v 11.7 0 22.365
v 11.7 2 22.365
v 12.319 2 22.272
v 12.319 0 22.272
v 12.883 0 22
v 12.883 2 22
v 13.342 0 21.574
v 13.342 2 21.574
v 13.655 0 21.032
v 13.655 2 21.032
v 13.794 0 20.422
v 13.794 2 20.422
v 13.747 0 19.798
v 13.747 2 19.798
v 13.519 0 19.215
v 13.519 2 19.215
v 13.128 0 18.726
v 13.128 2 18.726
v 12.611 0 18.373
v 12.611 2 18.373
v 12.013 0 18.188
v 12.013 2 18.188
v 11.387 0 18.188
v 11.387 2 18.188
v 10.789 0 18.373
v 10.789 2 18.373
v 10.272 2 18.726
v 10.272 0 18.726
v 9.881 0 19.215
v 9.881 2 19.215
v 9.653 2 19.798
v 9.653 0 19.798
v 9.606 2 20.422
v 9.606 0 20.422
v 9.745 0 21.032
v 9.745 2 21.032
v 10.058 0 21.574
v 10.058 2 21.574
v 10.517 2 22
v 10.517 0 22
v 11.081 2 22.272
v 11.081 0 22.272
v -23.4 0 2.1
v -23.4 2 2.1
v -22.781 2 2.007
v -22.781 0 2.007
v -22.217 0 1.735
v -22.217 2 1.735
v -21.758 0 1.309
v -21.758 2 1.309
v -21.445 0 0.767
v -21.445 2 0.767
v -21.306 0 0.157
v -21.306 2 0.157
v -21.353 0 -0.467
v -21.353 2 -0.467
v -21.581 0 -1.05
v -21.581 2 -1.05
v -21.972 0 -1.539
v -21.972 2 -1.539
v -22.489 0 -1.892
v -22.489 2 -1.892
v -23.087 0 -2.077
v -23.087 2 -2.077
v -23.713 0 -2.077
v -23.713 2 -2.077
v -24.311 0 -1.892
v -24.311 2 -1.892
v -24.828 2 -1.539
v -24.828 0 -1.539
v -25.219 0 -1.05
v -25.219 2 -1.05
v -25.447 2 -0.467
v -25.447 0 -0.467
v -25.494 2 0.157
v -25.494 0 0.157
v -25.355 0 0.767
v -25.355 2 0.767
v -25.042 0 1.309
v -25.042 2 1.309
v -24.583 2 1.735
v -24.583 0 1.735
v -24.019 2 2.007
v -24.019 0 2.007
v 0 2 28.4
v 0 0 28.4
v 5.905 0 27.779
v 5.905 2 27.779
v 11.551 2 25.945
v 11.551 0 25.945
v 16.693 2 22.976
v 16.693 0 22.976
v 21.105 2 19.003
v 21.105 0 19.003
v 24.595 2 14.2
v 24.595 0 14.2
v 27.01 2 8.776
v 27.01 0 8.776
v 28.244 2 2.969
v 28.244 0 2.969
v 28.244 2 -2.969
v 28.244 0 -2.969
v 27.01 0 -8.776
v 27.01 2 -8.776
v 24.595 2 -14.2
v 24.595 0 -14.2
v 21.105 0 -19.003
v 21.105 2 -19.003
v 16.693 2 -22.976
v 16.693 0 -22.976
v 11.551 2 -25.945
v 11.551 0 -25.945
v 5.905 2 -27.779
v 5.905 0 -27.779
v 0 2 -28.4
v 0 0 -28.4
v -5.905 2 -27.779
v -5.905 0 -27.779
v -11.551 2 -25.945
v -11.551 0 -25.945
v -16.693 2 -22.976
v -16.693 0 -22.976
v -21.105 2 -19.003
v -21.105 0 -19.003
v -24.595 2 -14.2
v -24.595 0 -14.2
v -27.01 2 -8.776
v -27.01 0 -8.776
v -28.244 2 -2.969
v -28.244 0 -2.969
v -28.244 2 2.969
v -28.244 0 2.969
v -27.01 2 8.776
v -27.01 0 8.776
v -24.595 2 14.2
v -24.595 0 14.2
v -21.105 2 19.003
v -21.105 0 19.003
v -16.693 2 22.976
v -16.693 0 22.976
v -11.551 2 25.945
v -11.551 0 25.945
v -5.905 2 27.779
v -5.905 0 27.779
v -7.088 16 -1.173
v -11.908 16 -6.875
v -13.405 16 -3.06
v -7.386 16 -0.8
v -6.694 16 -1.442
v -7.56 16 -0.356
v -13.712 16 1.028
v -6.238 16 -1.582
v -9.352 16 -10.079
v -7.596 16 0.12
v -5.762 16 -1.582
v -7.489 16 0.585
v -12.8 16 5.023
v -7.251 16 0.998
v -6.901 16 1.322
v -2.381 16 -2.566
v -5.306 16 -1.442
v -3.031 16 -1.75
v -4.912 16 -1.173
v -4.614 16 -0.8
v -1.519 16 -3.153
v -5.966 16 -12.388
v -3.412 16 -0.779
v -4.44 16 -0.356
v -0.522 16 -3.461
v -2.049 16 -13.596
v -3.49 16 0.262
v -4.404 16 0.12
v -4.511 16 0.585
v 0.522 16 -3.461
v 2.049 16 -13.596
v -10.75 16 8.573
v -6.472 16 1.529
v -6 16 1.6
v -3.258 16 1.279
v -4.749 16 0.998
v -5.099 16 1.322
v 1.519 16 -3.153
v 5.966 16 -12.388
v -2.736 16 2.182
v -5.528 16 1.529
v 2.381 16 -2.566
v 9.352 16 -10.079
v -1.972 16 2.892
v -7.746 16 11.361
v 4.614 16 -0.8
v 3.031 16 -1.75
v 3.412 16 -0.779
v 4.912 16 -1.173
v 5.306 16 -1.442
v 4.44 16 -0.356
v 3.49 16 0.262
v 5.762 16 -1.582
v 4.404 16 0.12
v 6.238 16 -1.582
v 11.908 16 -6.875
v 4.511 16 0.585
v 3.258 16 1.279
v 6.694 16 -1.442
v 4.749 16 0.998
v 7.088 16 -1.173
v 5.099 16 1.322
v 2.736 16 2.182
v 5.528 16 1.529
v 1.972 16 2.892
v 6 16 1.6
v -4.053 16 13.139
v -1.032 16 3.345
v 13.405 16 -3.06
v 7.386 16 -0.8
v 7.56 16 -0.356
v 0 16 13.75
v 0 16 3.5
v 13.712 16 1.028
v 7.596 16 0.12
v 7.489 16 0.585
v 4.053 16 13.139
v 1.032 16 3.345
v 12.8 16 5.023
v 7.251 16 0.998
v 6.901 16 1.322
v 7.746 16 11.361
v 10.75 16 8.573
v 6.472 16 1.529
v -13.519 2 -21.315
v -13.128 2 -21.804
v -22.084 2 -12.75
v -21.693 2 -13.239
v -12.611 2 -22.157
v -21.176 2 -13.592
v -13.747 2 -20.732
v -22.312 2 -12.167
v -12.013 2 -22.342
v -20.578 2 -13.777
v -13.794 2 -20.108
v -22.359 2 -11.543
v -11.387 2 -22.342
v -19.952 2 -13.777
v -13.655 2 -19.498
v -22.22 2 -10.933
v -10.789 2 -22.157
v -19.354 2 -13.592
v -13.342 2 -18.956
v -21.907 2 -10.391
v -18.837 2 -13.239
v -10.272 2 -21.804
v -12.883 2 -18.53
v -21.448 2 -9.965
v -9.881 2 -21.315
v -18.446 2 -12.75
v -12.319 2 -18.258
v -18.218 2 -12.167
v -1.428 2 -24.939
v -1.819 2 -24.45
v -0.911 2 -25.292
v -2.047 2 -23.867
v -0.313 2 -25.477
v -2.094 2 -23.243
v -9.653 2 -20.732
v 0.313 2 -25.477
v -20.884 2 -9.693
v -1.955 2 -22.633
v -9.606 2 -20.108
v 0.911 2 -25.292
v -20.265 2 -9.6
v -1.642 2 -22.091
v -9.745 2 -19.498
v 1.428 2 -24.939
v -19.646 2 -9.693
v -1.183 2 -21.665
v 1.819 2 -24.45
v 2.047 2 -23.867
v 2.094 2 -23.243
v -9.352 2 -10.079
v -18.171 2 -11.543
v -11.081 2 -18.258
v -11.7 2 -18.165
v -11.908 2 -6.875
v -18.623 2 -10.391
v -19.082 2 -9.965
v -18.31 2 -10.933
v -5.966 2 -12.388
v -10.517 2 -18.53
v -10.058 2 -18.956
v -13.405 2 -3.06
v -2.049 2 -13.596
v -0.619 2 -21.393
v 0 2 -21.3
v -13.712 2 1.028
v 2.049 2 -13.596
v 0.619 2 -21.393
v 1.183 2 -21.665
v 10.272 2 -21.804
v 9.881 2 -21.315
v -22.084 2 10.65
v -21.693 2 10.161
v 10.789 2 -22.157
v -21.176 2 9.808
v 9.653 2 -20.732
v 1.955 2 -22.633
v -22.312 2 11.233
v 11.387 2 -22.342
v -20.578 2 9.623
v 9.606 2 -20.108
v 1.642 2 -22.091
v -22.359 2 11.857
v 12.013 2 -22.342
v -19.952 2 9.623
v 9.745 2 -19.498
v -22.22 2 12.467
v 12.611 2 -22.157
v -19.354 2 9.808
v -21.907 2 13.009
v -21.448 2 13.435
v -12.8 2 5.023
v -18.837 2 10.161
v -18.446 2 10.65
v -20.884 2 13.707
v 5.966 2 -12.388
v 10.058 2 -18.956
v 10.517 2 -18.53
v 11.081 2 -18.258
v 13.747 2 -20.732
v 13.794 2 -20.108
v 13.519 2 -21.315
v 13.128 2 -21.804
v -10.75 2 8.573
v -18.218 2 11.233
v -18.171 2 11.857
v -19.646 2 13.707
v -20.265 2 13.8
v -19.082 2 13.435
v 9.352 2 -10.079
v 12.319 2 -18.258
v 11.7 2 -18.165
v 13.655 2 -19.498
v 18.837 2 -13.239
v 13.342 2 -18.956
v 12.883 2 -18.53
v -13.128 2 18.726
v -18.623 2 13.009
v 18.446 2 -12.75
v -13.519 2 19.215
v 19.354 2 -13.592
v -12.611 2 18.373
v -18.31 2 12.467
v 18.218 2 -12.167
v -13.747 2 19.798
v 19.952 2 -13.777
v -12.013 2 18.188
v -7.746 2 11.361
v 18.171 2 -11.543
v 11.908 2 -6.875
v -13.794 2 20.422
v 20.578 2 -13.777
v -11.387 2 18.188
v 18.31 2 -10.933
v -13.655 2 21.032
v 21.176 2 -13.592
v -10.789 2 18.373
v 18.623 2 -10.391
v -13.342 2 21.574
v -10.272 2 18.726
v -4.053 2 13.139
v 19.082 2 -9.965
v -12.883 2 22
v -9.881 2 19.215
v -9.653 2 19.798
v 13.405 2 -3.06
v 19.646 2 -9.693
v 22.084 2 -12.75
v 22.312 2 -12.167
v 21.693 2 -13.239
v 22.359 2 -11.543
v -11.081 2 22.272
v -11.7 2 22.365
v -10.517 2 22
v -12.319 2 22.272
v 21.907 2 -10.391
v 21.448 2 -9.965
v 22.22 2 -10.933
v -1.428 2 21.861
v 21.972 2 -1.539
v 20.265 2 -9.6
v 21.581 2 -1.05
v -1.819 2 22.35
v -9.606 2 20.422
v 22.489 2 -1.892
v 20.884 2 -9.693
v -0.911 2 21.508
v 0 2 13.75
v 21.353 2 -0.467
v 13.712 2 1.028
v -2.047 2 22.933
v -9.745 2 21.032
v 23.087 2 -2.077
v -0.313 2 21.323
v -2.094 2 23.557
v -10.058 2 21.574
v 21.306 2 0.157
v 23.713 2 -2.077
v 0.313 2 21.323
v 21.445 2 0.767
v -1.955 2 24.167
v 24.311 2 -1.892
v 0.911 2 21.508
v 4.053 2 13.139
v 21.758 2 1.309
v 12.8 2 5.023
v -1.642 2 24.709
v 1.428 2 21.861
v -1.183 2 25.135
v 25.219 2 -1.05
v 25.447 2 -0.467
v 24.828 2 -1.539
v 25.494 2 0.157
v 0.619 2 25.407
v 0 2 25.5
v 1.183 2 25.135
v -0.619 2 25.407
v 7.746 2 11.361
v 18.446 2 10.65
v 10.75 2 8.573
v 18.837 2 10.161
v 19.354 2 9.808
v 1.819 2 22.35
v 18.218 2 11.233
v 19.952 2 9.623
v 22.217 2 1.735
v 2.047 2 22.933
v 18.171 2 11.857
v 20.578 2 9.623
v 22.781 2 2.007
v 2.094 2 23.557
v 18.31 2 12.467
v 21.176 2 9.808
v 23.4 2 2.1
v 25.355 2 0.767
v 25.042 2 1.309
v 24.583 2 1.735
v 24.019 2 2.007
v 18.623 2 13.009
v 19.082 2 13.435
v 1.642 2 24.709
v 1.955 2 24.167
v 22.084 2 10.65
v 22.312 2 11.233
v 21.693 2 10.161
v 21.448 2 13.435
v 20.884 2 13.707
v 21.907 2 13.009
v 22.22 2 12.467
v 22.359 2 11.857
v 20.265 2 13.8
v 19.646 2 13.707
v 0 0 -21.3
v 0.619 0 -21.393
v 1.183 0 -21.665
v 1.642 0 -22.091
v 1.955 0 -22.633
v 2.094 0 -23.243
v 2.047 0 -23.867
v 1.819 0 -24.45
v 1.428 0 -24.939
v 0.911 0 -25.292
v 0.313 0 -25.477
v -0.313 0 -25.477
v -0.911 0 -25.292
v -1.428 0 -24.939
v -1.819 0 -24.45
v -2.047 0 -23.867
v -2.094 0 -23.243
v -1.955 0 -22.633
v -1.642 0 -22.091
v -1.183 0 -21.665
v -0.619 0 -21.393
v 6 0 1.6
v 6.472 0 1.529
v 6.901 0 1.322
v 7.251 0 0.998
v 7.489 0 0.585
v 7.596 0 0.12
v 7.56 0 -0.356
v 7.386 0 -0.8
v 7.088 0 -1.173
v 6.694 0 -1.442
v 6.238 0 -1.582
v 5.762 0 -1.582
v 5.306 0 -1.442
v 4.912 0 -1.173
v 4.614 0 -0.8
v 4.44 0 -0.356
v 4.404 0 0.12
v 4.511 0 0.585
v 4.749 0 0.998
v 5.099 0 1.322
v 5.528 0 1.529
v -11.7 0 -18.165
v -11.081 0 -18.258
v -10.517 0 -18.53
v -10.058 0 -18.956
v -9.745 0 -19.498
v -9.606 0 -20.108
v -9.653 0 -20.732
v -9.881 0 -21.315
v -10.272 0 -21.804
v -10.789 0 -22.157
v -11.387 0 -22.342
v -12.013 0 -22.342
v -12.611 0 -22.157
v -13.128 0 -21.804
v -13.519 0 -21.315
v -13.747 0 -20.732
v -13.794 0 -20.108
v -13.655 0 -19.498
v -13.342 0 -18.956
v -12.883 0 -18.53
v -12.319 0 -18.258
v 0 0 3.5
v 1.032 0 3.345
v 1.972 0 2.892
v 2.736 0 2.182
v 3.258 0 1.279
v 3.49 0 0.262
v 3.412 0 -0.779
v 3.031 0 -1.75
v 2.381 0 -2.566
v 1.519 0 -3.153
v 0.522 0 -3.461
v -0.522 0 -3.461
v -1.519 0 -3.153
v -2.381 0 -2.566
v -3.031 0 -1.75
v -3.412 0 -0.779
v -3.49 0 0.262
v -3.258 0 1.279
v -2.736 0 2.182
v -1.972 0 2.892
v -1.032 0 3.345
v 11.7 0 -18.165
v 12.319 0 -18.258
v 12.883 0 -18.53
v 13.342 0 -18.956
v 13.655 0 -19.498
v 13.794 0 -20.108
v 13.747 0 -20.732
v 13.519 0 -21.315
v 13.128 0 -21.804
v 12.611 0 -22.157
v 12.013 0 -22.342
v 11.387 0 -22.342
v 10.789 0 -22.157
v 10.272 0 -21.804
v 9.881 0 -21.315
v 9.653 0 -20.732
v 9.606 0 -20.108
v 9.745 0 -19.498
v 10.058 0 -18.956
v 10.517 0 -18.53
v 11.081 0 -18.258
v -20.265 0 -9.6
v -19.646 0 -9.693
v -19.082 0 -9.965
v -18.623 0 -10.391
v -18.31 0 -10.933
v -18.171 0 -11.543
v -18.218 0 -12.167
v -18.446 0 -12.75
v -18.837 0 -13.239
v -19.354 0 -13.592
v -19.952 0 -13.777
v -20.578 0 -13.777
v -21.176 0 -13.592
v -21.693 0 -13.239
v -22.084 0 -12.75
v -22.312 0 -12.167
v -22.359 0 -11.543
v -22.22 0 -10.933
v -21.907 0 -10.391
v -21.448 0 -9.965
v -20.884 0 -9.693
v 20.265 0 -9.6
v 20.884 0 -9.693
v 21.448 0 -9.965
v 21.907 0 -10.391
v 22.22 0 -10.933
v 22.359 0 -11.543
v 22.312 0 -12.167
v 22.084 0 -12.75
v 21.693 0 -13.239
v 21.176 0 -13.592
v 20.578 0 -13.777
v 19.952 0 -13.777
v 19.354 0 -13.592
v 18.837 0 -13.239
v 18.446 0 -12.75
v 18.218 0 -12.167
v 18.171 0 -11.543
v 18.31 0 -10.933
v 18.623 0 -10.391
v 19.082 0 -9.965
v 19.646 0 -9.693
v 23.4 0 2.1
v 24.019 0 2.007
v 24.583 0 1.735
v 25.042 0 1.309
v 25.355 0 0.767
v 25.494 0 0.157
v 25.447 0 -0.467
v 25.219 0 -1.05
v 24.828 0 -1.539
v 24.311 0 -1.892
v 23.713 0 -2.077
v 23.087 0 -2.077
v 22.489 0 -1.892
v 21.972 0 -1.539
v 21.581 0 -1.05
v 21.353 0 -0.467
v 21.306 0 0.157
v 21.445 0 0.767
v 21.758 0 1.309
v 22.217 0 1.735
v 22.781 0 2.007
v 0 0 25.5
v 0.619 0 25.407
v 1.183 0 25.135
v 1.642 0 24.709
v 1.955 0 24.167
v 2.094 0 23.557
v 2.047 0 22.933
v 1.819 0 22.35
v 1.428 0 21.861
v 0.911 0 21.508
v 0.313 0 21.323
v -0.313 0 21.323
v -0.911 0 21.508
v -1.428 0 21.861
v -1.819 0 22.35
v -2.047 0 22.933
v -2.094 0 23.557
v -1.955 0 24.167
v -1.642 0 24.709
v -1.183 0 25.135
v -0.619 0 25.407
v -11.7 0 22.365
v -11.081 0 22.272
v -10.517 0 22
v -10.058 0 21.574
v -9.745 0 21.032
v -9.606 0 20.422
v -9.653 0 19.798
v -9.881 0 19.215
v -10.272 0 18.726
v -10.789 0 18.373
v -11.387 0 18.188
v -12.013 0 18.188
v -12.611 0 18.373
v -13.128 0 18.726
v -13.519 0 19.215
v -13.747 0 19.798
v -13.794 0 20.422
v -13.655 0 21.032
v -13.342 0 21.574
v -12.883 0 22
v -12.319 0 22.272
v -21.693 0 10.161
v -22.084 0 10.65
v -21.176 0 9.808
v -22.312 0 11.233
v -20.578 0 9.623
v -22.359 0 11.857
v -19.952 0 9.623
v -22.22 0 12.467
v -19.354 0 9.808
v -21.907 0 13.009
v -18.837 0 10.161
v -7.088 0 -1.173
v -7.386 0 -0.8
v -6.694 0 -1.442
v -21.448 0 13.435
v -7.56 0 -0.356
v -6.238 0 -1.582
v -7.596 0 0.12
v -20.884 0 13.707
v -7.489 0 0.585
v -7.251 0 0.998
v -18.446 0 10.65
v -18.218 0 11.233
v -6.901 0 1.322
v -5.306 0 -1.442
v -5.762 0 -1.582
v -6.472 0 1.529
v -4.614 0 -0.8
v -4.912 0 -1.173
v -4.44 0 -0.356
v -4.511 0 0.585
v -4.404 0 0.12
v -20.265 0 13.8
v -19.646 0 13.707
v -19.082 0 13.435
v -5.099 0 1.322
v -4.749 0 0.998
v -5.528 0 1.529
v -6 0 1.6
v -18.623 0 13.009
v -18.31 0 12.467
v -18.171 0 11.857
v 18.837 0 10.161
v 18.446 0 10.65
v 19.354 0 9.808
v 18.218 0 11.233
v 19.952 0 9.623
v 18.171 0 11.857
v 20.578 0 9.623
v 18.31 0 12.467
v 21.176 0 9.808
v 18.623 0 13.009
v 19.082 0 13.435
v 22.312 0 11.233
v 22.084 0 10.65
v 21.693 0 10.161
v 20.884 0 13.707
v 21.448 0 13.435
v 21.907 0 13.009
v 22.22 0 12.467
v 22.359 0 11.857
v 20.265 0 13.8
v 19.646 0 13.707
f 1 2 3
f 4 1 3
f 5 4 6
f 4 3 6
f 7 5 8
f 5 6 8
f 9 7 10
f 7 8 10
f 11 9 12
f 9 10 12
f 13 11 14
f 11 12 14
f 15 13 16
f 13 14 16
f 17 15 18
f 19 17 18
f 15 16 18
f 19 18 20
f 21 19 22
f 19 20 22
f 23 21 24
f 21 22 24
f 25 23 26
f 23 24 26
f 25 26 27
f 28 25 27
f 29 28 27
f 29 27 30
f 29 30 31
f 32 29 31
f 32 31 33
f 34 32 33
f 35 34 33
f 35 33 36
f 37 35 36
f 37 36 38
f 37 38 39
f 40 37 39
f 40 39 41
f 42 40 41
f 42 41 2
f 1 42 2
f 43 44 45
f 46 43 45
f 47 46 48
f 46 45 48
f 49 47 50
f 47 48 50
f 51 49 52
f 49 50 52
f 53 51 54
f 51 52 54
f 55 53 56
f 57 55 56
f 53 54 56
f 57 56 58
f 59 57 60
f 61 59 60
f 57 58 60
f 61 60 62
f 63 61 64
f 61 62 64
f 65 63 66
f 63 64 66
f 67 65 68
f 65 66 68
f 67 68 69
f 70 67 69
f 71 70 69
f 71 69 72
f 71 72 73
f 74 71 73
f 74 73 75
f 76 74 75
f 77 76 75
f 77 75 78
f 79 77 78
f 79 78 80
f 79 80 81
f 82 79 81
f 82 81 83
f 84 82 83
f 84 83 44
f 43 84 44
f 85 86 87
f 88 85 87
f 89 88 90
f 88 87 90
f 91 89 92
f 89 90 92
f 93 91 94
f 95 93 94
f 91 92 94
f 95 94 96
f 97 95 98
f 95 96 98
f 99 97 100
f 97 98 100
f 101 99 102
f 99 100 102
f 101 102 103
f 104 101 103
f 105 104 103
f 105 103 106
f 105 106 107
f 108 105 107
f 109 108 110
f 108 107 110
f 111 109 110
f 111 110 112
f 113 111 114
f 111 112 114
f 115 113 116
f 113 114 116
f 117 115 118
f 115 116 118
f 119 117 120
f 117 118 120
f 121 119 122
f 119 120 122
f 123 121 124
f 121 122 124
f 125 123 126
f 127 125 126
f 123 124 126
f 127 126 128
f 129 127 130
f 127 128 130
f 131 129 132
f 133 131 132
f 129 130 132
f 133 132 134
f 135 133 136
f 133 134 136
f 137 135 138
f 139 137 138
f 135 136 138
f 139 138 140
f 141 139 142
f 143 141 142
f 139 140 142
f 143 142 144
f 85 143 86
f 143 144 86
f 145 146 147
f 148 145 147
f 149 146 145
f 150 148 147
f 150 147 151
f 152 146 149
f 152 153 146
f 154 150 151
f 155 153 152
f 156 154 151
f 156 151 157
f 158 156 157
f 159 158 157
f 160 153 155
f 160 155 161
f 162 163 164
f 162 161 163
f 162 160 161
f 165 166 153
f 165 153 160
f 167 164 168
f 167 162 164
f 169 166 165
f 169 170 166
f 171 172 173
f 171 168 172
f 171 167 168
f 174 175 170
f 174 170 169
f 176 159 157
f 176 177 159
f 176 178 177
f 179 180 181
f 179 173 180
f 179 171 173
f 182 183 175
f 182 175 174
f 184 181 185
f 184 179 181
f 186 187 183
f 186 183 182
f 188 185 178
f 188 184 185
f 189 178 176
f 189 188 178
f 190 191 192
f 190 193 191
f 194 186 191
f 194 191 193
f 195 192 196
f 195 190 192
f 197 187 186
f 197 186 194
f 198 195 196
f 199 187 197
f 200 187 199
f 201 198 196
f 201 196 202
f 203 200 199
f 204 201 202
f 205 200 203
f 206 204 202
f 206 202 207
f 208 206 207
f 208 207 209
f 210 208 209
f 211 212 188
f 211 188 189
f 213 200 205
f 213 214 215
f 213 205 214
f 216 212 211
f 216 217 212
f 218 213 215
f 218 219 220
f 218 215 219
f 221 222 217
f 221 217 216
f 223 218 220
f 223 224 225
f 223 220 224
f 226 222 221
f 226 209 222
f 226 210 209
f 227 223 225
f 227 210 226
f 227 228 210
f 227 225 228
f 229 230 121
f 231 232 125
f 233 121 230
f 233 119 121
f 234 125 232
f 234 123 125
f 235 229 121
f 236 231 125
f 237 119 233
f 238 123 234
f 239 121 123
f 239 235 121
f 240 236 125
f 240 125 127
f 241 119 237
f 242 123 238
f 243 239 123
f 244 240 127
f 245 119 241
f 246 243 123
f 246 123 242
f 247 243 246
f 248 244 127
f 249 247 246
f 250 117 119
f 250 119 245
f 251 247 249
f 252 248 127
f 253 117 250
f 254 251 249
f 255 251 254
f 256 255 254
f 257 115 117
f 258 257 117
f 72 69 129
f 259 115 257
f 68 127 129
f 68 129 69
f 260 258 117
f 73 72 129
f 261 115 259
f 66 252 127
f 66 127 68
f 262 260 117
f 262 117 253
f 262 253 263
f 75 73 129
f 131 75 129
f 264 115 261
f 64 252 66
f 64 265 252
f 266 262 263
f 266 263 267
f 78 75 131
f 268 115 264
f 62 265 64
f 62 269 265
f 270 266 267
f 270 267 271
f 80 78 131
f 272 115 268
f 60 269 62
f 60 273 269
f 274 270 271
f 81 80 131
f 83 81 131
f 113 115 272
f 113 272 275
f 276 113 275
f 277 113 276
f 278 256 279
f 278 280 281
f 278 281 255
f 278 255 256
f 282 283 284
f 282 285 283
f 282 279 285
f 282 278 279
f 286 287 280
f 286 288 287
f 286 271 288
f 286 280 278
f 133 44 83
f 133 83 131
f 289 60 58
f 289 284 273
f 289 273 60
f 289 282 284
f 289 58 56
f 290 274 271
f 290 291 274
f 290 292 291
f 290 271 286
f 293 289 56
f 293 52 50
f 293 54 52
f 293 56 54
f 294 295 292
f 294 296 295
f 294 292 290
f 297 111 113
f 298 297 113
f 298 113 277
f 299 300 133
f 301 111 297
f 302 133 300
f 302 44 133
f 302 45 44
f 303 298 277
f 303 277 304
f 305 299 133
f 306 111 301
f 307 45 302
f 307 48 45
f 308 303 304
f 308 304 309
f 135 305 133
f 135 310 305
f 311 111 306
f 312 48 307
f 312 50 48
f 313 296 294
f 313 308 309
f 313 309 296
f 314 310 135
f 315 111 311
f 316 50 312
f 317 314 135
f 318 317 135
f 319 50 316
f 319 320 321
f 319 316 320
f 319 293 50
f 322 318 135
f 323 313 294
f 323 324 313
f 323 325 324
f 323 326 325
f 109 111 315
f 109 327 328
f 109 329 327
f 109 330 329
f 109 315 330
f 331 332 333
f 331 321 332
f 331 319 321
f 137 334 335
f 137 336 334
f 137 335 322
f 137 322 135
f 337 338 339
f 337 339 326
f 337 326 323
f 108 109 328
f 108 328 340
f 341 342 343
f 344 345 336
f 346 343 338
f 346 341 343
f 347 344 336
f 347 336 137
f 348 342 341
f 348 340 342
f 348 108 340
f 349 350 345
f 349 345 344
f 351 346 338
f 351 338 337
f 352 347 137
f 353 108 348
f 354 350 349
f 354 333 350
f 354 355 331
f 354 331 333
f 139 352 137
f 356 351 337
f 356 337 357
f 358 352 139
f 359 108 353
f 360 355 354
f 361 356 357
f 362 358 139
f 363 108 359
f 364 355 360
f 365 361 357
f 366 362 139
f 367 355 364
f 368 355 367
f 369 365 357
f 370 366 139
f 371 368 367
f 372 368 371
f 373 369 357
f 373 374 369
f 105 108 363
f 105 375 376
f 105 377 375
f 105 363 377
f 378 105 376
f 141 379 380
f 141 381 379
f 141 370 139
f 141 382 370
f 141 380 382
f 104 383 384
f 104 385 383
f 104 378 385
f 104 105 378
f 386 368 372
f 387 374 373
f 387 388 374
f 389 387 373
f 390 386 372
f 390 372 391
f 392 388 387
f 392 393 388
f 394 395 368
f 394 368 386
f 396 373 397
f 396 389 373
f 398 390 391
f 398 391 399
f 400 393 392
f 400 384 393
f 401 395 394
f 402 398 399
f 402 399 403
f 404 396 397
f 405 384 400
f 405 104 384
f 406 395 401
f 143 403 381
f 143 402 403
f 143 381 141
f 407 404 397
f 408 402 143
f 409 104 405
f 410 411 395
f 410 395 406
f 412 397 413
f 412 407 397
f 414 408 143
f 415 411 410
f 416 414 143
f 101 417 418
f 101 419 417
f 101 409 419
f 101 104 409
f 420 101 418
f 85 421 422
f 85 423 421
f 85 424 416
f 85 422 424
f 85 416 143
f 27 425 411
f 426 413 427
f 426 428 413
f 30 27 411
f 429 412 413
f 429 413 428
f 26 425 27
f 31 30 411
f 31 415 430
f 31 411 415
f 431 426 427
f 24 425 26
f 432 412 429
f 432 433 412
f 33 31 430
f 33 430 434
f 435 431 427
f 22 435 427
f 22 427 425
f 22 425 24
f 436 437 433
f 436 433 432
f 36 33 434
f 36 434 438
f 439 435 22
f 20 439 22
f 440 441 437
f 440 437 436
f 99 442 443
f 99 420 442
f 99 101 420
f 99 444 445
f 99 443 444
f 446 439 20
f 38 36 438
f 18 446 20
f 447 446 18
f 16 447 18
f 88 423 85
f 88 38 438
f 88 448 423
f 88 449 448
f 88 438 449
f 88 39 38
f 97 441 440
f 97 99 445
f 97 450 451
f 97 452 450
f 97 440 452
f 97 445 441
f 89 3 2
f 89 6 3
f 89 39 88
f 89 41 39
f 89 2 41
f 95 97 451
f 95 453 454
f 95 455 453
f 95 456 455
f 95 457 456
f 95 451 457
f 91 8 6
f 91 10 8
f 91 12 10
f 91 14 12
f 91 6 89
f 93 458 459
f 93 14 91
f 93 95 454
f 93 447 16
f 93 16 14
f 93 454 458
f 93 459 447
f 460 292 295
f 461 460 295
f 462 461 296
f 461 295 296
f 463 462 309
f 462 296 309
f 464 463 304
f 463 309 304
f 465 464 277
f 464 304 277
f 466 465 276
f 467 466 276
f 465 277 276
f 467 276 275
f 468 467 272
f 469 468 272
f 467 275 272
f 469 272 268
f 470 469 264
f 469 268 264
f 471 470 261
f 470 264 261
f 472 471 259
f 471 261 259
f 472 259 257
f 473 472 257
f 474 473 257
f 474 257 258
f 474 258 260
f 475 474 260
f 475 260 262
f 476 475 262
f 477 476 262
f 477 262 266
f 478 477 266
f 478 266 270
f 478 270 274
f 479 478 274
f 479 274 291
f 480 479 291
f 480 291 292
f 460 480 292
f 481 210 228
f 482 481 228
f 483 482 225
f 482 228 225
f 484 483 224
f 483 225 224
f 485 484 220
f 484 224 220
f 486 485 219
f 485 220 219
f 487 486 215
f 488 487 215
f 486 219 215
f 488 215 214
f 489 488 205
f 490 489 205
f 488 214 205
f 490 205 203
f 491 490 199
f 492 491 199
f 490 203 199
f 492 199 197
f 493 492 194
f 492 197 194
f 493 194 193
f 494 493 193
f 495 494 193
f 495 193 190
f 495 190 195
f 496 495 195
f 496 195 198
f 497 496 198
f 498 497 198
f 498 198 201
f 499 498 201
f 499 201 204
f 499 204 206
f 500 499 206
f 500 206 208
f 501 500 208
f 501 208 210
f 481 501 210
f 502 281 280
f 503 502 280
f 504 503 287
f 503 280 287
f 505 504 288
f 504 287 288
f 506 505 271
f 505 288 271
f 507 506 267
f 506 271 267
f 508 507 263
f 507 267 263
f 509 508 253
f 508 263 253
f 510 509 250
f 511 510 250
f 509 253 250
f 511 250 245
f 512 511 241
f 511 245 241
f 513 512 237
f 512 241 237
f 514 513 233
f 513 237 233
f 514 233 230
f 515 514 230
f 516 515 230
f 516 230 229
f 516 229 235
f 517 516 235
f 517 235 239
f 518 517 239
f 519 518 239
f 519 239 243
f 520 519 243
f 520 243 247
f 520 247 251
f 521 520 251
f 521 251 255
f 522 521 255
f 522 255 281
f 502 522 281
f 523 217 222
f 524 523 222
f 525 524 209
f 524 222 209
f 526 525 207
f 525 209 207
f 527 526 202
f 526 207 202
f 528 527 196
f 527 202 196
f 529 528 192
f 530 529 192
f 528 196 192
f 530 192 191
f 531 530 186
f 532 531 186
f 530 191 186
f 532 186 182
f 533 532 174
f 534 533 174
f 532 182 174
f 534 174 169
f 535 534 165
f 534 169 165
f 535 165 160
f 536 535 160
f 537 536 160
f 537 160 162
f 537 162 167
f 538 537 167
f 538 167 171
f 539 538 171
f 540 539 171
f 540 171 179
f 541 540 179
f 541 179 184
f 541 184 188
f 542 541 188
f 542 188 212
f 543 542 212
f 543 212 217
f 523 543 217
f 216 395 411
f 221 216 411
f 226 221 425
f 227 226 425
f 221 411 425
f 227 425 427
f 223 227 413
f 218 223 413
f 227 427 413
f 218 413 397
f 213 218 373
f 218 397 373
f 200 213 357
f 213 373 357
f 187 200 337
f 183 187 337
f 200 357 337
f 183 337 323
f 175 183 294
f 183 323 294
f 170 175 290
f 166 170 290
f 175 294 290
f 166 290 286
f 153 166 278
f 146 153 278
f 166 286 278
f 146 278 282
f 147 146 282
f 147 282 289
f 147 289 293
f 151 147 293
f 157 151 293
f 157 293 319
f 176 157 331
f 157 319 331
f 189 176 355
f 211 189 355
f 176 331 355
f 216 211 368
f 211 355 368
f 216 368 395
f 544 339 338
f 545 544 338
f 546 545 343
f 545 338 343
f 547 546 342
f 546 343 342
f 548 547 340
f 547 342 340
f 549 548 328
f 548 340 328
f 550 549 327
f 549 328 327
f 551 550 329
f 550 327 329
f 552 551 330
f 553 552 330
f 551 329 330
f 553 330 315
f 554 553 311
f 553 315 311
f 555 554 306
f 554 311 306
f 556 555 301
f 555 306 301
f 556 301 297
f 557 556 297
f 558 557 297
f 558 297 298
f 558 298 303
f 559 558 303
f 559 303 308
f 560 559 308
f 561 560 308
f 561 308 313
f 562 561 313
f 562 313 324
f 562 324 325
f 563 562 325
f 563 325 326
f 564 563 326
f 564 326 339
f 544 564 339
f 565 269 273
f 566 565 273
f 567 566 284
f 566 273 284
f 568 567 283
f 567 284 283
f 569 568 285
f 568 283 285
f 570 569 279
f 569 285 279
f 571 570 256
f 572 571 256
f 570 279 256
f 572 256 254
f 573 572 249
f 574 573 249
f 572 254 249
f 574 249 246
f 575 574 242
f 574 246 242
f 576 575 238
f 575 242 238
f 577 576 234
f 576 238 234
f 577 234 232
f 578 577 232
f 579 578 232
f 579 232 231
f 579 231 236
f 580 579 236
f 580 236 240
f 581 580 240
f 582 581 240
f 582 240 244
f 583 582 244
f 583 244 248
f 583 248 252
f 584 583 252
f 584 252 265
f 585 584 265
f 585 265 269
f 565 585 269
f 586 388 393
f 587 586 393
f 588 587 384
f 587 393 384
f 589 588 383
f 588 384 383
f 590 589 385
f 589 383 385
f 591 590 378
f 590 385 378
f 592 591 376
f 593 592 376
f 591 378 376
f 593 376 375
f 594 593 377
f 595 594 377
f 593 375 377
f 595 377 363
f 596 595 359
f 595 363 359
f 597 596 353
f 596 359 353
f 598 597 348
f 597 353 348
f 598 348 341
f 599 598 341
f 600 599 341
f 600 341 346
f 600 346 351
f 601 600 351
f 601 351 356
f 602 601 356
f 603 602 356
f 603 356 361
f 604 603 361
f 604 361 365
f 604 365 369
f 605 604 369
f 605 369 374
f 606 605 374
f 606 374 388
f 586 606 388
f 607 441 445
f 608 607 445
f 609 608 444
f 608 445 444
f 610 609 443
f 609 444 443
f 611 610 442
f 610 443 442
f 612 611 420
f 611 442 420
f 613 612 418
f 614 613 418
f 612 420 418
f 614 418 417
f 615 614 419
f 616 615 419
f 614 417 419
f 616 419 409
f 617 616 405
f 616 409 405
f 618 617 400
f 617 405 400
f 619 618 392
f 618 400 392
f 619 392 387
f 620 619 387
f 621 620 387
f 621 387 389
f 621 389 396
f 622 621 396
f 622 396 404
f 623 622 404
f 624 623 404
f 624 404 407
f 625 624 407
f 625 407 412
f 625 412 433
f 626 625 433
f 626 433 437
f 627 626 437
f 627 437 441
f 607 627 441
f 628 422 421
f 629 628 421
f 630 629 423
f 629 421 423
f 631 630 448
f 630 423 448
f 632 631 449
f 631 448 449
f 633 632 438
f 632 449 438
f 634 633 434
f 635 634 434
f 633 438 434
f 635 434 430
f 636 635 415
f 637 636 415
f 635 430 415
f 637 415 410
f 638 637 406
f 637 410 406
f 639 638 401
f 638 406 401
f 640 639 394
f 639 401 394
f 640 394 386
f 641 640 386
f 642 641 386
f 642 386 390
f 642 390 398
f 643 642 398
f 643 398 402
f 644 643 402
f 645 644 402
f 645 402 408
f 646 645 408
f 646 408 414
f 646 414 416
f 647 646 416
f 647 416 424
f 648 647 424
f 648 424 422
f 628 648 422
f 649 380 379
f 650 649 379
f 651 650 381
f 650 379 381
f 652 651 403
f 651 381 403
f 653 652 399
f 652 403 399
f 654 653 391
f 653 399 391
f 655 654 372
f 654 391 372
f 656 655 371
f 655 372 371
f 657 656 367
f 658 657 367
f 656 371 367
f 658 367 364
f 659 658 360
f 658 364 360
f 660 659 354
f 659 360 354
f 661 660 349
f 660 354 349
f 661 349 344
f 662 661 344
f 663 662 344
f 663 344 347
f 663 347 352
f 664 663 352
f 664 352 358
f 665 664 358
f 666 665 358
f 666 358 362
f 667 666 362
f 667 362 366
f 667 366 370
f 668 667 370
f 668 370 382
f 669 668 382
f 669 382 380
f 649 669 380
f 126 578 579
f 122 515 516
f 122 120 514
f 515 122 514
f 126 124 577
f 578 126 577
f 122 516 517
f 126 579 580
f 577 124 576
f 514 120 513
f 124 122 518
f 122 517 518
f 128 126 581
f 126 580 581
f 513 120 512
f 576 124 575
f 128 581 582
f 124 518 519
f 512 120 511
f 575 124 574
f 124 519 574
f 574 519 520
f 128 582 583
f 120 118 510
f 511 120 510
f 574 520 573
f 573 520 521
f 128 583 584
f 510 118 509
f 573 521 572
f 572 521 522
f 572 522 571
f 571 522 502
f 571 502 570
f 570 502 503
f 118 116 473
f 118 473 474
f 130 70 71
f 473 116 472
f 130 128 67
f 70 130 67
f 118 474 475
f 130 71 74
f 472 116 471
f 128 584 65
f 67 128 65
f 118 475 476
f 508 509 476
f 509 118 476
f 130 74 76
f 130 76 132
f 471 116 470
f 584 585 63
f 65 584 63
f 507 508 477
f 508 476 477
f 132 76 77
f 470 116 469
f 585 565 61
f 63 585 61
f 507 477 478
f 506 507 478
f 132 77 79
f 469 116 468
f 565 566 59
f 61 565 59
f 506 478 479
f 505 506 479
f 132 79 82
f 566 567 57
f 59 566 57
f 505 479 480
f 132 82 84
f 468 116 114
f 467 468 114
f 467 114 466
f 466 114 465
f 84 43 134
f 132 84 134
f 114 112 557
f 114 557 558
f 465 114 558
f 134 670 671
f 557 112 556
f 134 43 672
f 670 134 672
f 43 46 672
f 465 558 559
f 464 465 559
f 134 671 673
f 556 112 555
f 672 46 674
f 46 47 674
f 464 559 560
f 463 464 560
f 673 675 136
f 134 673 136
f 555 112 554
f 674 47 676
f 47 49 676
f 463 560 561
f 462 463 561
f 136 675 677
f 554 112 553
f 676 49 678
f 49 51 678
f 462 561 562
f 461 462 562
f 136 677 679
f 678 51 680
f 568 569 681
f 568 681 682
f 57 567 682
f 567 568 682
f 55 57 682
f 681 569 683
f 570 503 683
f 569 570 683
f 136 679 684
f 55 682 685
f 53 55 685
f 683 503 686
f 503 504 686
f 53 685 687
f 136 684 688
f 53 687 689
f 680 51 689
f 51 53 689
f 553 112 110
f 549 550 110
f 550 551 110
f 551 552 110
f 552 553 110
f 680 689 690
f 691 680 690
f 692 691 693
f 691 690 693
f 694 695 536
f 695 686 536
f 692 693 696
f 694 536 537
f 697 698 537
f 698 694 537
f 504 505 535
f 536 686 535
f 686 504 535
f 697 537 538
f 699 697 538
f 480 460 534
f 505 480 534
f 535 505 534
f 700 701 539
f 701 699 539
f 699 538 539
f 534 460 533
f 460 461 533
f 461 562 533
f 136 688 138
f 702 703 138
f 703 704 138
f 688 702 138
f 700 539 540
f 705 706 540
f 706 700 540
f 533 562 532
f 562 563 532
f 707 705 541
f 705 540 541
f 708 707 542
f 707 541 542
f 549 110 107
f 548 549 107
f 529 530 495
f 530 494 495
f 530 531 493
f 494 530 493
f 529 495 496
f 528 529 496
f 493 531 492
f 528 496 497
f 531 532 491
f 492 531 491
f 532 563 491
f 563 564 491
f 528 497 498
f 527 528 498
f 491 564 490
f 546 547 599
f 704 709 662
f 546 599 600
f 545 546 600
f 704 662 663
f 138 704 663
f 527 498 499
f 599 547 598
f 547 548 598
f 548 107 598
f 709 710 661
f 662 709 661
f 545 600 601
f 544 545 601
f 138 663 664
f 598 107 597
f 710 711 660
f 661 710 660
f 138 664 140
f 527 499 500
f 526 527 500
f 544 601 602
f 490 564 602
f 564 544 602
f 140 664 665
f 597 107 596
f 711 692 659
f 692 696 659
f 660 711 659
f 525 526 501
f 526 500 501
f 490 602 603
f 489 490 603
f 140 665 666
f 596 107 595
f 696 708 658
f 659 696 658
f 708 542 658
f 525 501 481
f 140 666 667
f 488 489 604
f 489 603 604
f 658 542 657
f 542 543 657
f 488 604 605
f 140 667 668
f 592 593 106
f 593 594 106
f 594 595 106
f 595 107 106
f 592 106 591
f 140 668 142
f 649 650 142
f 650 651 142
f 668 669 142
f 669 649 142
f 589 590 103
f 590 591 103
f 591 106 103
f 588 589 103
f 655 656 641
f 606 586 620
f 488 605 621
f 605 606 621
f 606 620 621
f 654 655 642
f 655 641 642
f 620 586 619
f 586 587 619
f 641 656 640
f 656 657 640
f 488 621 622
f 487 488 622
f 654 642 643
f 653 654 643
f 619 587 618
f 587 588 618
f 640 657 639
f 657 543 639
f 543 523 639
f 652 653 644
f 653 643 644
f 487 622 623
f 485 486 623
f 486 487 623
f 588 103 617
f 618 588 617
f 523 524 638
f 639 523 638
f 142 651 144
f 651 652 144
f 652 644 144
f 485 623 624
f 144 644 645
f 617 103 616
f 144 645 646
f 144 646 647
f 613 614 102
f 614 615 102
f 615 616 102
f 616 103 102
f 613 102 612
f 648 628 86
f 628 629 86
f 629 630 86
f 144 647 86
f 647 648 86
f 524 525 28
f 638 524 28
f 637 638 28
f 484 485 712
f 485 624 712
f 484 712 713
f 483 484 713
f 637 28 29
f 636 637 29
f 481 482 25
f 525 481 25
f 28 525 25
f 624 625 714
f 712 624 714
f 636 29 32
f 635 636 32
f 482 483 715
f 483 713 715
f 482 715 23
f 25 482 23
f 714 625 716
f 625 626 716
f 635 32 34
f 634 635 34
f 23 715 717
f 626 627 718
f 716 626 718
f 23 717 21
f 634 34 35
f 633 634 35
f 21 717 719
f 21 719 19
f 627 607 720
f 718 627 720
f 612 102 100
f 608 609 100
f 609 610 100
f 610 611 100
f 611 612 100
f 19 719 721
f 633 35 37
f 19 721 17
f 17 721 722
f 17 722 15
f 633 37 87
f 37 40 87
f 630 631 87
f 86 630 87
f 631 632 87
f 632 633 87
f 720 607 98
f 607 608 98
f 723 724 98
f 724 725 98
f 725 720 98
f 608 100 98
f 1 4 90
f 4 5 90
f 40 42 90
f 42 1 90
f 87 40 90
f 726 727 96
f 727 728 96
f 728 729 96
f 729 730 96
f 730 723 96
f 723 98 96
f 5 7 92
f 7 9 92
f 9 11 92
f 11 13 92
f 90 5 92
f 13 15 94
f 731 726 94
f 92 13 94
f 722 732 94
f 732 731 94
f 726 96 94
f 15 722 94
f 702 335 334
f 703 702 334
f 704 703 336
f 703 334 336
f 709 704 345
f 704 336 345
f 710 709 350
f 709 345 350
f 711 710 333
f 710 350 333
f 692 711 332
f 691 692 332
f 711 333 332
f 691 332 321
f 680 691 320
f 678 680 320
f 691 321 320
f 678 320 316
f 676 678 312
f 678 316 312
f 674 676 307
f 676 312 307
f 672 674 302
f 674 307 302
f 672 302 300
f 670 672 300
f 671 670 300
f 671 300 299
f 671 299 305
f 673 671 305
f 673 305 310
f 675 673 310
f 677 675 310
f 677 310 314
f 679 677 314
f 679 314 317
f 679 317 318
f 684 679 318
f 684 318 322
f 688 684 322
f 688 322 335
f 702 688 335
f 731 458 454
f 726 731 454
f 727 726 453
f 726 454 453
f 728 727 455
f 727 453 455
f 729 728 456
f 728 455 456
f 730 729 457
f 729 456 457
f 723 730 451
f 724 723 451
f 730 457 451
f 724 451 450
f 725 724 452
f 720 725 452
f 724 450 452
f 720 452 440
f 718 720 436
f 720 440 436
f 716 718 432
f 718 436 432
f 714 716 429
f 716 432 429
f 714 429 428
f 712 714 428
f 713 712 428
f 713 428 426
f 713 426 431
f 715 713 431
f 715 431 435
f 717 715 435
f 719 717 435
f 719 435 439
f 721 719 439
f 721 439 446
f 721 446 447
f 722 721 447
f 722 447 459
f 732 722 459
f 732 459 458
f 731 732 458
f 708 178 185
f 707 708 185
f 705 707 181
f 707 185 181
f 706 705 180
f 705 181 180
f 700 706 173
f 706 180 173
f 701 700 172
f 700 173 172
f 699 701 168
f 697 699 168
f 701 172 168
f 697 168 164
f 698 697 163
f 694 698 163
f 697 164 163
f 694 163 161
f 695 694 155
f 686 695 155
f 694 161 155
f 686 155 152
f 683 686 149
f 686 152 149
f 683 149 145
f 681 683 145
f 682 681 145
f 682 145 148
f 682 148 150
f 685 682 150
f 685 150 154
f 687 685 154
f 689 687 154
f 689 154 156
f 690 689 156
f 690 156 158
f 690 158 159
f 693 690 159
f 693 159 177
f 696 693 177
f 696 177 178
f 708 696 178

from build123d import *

# Parameters (mm, degrees)
SKETCH_1_R          = 28.4
EXTRUDE_1_DEPTH     = 2
SKETCH_2_R          = 13.75
EXTRUDE_2_DEPTH     = 14
SKETCH_3_R          = 3.5
SKETCH_3_R_2        = 1.6
CUT_EXTRUDE_1_DEPTH = 44.233320483
SKETCH_4_R          = 2.1
CUT_EXTRUDE_2_DEPTH = 43.533751304


with BuildPart() as part:
    # ｽｹｯﾁ1 → ﾎﾞｽ - 押し出し1 (new body)
    with BuildSketch(Plane(origin=(0, 0, 0), x_dir=(1, 0, 0), z_dir=(0, 1, 0))):
        with Locations(Location((0, 0, 0), (0, 0, 270))):
            Circle(SKETCH_1_R)
    extrude(amount=EXTRUDE_1_DEPTH)

    # ｽｹｯﾁ2 → ﾎﾞｽ - 押し出し2 (add)
    with BuildSketch(Plane(origin=(0, 2, 0), x_dir=(1, 0, 0), z_dir=(0, 1, 0))):
        with Locations(Location((0, 0, 0), (0, 0, 270))):
            Circle(SKETCH_2_R)
    extrude(amount=EXTRUDE_2_DEPTH)

    # ｽｹｯﾁ3 → ｶｯﾄ - 押し出し1 (cut, through all)
    with BuildSketch(Plane(origin=(0, 16, 0), x_dir=(1, 0, 0), z_dir=(0, 1, 0))):
        with Locations(Location((0, 0, 0), (0, 0, 270))):
            Circle(SKETCH_3_R)
        with Locations(Location((-6, 0, 0), (0, 0, 270))):
            Circle(SKETCH_3_R_2)
        with Locations(Location((6, 0, 0), (0, 0, 270))):
            Circle(SKETCH_3_R_2)
    extrude(amount=-CUT_EXTRUDE_1_DEPTH, mode=Mode.SUBTRACT)

    # ｽｹｯﾁ4 → ｶｯﾄ - 押し出し2 (cut, through all)
    with BuildSketch(Plane(origin=(0, 2, 0), x_dir=(1, 0, 0), z_dir=(0, 1, 0))):
        with Locations(Location((0, 23.4, 0), (0, 0, 270))):
            Circle(SKETCH_4_R)
        with Locations(Location((11.7, 20.264994449, 0), (0, 0, 270))):
            Circle(SKETCH_4_R)
        with Locations(Location((20.264994449, 11.7, 0), (0, 0, 270))):
            Circle(SKETCH_4_R)
        with Locations(Location((23.4, 0, 0), (0, 0, 270))):
            Circle(SKETCH_4_R)
        with Locations(Location((20.264994449, -11.7, 0), (0, 0, 270))):
            Circle(SKETCH_4_R)
        with Locations(Location((11.7, -20.264994449, 0), (0, 0, 270))):
            Circle(SKETCH_4_R)
        with Locations(Location((0, -23.4, 0), (0, 0, 270))):
            Circle(SKETCH_4_R)
        with Locations(Location((-11.7, -20.264994449, 0), (0, 0, 270))):
            Circle(SKETCH_4_R)
        with Locations(Location((-20.264994449, -11.7, 0), (0, 0, 270))):
            Circle(SKETCH_4_R)
        with Locations(Location((-23.4, 0, 0), (0, 0, 270))):
            Circle(SKETCH_4_R)
        with Locations(Location((-20.264994449, 11.7, 0), (0, 0, 270))):
            Circle(SKETCH_4_R)
        with Locations(Location((-11.7, 20.264994449, 0), (0, 0, 270))):
            Circle(SKETCH_4_R)
    extrude(amount=-CUT_EXTRUDE_2_DEPTH, mode=Mode.SUBTRACT)


solid = part.part
